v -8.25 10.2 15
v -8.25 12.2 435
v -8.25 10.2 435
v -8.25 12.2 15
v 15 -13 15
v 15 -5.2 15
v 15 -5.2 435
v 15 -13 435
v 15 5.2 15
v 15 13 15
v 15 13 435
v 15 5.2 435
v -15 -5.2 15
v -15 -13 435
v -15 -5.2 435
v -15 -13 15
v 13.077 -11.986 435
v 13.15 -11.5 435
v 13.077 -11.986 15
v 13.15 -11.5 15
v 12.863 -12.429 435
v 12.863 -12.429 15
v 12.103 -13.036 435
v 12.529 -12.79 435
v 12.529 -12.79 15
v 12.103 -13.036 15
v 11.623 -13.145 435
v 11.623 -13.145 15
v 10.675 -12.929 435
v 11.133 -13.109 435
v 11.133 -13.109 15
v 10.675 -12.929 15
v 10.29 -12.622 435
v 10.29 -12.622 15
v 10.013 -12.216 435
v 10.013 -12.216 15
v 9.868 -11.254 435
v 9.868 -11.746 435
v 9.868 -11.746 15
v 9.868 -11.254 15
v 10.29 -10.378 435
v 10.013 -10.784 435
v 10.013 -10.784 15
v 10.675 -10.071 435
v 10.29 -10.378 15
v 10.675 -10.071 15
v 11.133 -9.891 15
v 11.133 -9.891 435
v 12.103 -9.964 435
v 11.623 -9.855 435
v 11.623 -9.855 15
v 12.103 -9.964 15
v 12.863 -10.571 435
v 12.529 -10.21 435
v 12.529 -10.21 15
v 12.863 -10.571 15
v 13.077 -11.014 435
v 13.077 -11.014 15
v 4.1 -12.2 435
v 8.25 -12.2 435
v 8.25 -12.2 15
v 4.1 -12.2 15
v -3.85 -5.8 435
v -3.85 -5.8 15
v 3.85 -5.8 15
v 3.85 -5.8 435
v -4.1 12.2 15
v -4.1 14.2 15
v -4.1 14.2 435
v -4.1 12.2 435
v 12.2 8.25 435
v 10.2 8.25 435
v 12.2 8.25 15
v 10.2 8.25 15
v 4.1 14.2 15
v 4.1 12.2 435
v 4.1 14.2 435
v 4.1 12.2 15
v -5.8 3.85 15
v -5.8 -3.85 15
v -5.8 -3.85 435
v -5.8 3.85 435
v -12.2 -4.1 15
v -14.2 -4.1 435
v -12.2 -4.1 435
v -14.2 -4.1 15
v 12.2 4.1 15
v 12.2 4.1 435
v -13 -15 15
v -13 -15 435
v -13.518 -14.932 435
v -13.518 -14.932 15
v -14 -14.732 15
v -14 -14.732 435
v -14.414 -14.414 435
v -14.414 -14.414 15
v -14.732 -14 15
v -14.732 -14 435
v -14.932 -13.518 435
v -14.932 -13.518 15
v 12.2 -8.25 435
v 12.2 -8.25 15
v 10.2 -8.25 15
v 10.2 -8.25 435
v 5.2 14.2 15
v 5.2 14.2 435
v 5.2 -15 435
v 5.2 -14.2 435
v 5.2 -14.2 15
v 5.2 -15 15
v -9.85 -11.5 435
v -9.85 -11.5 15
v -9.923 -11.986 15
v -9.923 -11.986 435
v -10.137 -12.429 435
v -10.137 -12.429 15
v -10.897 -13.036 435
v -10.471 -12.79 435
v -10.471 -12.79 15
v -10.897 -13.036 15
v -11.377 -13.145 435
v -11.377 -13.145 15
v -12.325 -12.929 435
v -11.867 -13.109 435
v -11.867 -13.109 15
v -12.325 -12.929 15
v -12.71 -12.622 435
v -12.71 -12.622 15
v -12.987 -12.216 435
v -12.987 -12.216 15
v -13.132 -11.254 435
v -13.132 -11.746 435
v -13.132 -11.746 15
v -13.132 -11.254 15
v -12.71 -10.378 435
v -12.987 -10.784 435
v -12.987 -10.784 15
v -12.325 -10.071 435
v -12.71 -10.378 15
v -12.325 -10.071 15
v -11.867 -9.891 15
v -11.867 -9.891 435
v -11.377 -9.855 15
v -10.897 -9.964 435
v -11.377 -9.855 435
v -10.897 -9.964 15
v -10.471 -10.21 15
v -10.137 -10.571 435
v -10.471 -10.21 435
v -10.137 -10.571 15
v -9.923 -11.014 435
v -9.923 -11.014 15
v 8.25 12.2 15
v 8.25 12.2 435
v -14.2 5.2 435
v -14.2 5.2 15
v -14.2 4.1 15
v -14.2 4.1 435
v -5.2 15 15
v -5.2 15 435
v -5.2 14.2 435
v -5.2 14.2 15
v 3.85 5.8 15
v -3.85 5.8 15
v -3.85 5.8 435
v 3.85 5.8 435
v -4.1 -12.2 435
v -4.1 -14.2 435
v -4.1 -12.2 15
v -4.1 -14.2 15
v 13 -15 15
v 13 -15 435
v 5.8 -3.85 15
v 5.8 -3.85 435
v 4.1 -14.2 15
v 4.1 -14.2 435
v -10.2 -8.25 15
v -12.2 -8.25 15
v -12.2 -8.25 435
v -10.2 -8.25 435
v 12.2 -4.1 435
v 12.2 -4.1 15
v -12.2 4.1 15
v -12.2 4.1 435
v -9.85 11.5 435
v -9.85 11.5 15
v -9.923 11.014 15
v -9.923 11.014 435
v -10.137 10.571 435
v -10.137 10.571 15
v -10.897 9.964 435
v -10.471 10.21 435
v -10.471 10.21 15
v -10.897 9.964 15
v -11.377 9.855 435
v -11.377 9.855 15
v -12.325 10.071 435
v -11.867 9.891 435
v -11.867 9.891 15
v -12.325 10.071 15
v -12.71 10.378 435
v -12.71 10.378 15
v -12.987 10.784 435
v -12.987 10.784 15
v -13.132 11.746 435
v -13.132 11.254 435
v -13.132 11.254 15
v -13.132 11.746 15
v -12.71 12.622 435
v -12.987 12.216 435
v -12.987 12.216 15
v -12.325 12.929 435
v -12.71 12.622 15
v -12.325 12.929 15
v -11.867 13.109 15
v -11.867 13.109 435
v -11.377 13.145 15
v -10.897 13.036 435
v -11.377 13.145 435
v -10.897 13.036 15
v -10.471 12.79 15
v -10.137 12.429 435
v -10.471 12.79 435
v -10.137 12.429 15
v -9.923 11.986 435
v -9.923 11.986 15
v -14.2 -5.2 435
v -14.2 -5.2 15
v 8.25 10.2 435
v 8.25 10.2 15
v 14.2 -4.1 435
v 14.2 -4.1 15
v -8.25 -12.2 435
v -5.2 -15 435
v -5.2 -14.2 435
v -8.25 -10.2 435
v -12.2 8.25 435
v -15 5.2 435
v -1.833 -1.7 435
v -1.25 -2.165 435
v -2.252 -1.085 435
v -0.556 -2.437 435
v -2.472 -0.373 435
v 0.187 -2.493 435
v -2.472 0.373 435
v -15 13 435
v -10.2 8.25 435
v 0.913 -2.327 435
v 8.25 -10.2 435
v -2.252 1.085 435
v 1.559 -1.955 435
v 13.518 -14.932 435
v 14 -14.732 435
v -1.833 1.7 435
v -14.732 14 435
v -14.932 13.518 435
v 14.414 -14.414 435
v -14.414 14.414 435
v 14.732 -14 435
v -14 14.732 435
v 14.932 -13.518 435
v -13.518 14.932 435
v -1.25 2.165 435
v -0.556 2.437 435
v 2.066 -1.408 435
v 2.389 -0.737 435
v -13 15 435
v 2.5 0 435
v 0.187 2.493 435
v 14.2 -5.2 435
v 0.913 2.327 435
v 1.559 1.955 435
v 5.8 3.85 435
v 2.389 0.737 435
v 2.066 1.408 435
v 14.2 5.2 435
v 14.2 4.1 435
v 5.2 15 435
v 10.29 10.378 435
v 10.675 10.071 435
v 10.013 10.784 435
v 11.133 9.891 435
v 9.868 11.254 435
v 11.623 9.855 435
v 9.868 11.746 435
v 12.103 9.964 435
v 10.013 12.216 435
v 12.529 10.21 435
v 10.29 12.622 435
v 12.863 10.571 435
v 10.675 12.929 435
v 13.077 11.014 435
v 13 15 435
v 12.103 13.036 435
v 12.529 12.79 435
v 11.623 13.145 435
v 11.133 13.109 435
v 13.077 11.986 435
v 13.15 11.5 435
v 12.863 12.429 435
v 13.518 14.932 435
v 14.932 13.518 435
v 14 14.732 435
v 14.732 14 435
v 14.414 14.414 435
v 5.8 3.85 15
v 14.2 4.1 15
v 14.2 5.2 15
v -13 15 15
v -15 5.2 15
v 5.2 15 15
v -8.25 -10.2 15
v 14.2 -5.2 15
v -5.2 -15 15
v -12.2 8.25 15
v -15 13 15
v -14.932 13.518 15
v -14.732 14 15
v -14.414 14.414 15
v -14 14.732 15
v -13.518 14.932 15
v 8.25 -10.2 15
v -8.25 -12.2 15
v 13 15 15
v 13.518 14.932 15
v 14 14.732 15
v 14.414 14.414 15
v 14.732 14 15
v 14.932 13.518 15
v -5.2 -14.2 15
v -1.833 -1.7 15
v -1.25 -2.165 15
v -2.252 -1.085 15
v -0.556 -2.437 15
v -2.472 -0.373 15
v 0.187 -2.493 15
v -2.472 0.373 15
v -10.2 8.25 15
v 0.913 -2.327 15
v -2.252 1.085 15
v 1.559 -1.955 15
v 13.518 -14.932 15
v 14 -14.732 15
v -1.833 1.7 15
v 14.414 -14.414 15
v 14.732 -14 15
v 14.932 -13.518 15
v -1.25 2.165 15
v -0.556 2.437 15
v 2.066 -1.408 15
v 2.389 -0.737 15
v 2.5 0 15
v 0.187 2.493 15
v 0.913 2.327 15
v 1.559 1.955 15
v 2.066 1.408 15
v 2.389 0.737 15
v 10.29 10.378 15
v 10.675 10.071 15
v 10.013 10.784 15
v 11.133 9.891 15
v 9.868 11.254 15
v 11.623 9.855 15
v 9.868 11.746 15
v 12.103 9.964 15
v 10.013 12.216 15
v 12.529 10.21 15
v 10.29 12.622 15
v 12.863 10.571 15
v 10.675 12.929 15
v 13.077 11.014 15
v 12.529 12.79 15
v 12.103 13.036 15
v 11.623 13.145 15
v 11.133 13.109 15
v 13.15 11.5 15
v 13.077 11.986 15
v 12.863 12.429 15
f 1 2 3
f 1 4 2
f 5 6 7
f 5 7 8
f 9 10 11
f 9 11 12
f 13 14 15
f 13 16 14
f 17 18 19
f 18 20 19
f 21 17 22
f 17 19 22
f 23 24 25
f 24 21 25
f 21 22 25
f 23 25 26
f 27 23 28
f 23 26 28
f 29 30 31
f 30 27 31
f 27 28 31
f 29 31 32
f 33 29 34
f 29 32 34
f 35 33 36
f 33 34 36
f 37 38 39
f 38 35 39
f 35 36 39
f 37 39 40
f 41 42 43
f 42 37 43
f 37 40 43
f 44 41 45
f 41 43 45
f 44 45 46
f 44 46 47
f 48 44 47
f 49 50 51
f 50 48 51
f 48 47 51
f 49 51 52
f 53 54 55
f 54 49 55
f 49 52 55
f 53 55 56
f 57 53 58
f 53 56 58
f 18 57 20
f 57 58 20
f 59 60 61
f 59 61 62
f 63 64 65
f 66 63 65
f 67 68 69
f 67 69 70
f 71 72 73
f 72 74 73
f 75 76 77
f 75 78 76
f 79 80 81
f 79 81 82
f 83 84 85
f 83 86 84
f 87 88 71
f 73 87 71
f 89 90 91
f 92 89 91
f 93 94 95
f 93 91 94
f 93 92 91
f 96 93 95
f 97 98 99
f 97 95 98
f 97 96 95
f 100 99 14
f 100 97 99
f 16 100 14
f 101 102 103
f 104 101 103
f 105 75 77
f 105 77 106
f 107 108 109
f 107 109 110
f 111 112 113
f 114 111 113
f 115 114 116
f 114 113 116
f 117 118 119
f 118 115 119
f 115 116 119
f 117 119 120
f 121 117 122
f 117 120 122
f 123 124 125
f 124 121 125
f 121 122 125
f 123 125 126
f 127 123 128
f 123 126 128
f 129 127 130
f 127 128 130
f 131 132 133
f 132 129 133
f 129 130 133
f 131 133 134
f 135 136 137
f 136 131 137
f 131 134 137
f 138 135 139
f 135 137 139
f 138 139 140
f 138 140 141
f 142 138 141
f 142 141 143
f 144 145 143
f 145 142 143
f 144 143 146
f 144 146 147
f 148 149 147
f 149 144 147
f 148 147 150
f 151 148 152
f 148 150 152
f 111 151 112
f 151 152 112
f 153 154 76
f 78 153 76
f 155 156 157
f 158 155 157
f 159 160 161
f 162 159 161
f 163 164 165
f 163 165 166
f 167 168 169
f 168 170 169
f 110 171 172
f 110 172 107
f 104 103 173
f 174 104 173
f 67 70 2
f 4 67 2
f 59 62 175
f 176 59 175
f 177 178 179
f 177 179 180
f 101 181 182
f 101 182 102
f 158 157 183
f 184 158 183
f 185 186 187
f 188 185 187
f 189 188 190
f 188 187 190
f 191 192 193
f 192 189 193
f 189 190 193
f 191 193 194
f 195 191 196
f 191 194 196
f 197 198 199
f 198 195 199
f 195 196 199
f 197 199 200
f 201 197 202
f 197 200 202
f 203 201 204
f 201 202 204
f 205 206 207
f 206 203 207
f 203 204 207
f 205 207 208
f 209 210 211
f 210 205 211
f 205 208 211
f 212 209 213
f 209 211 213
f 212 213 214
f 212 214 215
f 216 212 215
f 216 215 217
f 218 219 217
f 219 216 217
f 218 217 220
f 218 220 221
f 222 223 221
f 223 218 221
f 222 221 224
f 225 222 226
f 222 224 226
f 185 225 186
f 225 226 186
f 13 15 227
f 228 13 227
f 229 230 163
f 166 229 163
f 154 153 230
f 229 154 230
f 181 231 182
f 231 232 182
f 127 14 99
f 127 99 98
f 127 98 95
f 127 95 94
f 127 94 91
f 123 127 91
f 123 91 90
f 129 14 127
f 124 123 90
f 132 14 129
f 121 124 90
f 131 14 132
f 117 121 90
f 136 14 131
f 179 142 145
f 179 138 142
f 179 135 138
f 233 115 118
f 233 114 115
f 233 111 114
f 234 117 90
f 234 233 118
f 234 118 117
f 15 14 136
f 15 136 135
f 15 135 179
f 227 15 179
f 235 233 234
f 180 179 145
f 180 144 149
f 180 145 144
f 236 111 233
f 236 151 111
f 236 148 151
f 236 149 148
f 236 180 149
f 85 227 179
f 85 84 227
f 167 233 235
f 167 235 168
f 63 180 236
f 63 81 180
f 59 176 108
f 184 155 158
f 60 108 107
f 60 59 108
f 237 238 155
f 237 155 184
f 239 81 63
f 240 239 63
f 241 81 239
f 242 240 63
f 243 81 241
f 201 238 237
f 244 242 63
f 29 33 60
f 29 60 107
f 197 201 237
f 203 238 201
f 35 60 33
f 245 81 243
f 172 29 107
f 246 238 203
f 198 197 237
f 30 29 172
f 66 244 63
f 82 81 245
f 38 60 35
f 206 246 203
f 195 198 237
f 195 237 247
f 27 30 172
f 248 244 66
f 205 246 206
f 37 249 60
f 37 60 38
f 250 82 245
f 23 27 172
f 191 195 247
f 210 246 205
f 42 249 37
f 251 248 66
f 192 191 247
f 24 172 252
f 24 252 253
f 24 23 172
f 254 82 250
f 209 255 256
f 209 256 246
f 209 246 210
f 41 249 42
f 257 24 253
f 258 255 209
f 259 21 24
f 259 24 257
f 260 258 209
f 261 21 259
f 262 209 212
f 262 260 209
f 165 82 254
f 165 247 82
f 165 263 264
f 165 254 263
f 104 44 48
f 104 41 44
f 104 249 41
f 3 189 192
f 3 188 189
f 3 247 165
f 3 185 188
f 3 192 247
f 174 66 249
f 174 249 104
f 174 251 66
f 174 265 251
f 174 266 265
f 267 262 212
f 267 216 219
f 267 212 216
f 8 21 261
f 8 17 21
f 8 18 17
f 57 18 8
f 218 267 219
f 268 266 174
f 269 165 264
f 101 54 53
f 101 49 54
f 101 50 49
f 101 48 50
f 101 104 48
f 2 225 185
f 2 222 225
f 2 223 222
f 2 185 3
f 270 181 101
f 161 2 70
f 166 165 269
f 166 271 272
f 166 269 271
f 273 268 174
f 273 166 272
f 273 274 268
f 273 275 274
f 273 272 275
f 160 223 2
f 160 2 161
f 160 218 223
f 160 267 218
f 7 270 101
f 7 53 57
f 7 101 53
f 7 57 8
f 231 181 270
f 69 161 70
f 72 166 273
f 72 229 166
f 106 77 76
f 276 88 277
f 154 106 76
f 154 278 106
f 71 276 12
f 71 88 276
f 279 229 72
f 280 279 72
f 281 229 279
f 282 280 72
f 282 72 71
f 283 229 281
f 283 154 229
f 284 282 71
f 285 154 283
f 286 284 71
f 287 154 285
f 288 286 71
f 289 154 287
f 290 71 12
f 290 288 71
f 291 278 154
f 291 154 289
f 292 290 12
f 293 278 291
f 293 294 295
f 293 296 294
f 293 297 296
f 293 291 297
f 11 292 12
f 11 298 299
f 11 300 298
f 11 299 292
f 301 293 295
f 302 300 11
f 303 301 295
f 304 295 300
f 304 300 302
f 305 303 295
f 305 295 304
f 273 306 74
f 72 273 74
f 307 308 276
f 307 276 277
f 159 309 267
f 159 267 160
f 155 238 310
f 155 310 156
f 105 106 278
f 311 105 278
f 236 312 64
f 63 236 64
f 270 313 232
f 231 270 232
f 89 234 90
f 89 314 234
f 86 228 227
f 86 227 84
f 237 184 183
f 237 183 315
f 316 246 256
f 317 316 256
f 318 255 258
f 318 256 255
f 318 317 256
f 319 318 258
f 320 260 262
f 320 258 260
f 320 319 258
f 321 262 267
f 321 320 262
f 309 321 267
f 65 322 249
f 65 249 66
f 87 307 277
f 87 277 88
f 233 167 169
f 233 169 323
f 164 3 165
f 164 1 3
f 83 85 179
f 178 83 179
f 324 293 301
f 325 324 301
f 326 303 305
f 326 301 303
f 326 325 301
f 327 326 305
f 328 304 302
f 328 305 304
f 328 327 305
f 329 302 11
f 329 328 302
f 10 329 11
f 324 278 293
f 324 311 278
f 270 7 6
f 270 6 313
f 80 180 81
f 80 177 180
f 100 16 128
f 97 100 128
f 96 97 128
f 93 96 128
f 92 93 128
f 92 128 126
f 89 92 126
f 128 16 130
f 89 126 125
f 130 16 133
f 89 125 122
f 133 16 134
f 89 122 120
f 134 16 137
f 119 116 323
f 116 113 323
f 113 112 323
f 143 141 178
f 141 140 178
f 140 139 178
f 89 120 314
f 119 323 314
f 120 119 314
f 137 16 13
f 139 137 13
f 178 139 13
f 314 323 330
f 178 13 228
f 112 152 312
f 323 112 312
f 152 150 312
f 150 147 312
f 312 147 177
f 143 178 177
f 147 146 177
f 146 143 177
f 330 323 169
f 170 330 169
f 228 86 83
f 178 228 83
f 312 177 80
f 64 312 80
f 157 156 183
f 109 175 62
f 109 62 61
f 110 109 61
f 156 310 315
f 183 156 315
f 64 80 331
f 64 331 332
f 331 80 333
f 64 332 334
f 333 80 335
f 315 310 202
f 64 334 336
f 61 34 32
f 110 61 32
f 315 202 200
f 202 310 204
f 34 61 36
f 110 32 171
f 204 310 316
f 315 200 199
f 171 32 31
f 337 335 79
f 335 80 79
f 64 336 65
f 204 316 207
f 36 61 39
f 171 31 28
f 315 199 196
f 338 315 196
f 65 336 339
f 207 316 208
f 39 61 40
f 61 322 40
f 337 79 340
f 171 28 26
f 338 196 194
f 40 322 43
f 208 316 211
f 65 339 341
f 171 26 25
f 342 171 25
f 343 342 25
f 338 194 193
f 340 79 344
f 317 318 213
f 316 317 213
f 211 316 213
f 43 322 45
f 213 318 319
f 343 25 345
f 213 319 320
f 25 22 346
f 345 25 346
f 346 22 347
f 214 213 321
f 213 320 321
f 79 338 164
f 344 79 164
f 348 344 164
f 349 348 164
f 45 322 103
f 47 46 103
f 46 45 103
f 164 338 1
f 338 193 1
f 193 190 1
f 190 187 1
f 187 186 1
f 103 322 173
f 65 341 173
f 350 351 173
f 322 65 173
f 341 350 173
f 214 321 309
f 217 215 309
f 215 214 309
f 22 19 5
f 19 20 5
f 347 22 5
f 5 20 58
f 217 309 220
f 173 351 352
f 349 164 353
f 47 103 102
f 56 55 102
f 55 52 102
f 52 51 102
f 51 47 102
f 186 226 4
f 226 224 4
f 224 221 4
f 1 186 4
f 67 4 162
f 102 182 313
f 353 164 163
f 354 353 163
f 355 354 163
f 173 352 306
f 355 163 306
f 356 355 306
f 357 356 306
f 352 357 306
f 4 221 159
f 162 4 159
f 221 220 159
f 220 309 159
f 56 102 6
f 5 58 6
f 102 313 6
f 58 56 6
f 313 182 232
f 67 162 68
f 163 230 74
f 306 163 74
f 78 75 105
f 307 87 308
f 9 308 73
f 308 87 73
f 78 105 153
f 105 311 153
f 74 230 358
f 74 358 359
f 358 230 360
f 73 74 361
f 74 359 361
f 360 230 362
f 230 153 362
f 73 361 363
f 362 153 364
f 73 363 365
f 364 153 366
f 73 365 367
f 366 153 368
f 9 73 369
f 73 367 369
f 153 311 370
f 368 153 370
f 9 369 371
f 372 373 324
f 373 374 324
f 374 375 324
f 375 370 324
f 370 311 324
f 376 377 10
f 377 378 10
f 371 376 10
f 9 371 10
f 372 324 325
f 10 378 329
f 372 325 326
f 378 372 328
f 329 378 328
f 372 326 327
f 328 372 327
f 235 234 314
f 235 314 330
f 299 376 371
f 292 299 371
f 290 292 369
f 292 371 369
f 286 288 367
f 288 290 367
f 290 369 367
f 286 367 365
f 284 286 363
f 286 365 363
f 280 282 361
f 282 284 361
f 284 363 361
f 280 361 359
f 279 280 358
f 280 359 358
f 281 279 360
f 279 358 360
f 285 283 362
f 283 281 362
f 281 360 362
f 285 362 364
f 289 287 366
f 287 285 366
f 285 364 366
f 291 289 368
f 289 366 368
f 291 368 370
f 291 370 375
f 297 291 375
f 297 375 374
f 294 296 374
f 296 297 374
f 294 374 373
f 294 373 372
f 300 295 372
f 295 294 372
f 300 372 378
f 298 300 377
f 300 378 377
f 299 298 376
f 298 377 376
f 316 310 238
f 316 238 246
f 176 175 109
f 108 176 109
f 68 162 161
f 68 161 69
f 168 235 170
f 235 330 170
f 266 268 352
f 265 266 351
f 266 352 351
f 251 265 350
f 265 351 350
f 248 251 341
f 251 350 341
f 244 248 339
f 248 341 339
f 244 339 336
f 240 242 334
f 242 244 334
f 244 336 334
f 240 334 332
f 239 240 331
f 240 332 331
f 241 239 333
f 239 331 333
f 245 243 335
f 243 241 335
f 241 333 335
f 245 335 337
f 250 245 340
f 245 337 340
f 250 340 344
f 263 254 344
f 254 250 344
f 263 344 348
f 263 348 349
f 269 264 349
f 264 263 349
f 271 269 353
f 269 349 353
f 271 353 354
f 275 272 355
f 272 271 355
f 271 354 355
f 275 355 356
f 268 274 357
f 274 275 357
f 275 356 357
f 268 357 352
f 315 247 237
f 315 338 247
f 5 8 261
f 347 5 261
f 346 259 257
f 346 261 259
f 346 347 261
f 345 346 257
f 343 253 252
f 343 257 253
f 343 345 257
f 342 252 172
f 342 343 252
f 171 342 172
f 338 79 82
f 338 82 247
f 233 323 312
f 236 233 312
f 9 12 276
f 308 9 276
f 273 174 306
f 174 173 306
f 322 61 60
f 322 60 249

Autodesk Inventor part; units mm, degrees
sketch "Sketch" plane through (0, 0, 0) normal (0, 0, 1) x (1, 0, 0)
  line L0 (-13, 15) -> (13, 15)
  line L1 (15, 13) -> (15, -13)
  line L2 (-15, 15) -> (15, -15) construction
  line L3 (15, 15) -> (-15, -15) construction
  line L4 (-5.2, 15) -> (-5.2, 14.2)
  line L5 (-5.2, 14.2) -> (-4.1, 14.2)
  line L6 (-4.1, 14.2) -> (-4.1, 12.2)
  line L7 (-4.1, 12.2) -> (-8.25, 12.2)
  line L8 (-8.25, 12.2) -> (-8.25, 10.2)
  line L9 (-8.25, 10.2) -> (-3.85, 5.8)
  line L10 (-3.85, 5.8) -> (3.85, 5.8)
  line L11 (8.25, 12.2) -> (4.1, 12.2)
  line L12 (4.1, 12.2) -> (4.1, 14.2)
  line L13 (4.1, 14.2) -> (5.2, 14.2)
  line L14 (5.2, 14.2) -> (5.2, 15)
  line L15 (8.25, 12.2) -> (8.25, 10.2)
  line L16 (8.25, 10.2) -> (3.85, 5.8)
  line L17 (-2.5, 0) -> (0, 0)
  line L18 (-5.2, -15) -> (-5.2, -14.2)
  line L19 (-5.2, -14.2) -> (-4.1, -14.2)
  line L20 (-4.1, -14.2) -> (-4.1, -12.2)
  line L21 (-4.1, -12.2) -> (-8.25, -12.2)
  line L22 (-8.25, -12.2) -> (-8.25, -10.2)
  line L23 (-8.25, -10.2) -> (-3.85, -5.8)
  line L24 (-3.85, -5.8) -> (3.85, -5.8)
  line L25 (8.25, -12.2) -> (4.1, -12.2)
  line L26 (4.1, -12.2) -> (4.1, -14.2)
  line L27 (4.1, -14.2) -> (5.2, -14.2)
  line L28 (5.2, -14.2) -> (5.2, -15)
  line L29 (8.25, -12.2) -> (8.25, -10.2)
  line L30 (8.25, -10.2) -> (3.85, -5.8)
  line L31 (15, 5.2) -> (14.2, 5.2)
  line L32 (14.2, 5.2) -> (14.2, 4.1)
  line L33 (14.2, 4.1) -> (12.2, 4.1)
  line L34 (12.2, 4.1) -> (12.2, 8.25)
  line L35 (15, -5.2) -> (14.2, -5.2)
  line L36 (14.2, -5.2) -> (14.2, -4.1)
  line L37 (14.2, -4.1) -> (12.2, -4.1)
  line L38 (12.2, -4.1) -> (12.2, -8.25)
  line L39 (12.2, -8.25) -> (10.2, -8.25)
  line L40 (10.2, -8.25) -> (5.8, -3.85)
  line L41 (5.8, -3.85) -> (5.8, 3.85)
  line L42 (5.8, 3.85) -> (10.2, 8.25)
  line L43 (10.2, 8.25) -> (12.2, 8.25)
  line L44 (-15, 5.2) -> (-14.2, 5.2)
  line L45 (-14.2, 5.2) -> (-14.2, 4.1)
  line L46 (-14.2, 4.1) -> (-12.2, 4.1)
  line L47 (-12.2, 4.1) -> (-12.2, 8.25)
  line L48 (-15, -5.2) -> (-14.2, -5.2)
  line L49 (-14.2, -5.2) -> (-14.2, -4.1)
  line L50 (-14.2, -4.1) -> (-12.2, -4.1)
  line L51 (-12.2, -4.1) -> (-12.2, -8.25)
  line L52 (-12.2, -8.25) -> (-10.2, -8.25)
  line L53 (-10.2, -8.25) -> (-5.8, -3.85)
  line L54 (-5.8, -3.85) -> (-5.8, 3.85)
  line L55 (-5.8, 3.85) -> (-10.2, 8.25)
  line L56 (-10.2, 8.25) -> (-12.2, 8.25)
  circle A0 centre (11.5, 11.5) radius 1.65
  circle A1 centre (11.5, -11.5) radius 1.65
  circle A2 centre (-11.5, 11.5) radius 1.65
  circle A3 centre (-11.5, -11.5) radius 1.65
  line L57 (-15, -13) -> (-15, -5.2)
  line L58 (-15, 5.2) -> (-15, 13)
  line L59 (13, -15) -> (5.2, -15)
  line L60 (-5.2, -15) -> (-13, -15)
  arc A4 (-13, 15) -> (-15, 13) centre (-13, 13) ccw
  arc A5 (15, 13) -> (13, 15) centre (13, 13) ccw
  arc A6 (13, -15) -> (15, -13) centre (13, -13) ccw
  arc A7 (-15, -13) -> (-13, -15) centre (-13, -13) ccw
  circle A8 centre (0, 0) radius 2.5
  point P0 (0, 0)
  point P1 (0, 5.8)
  point P2 (0, -2.5)
  point P3 (0, 2.5)
  dimension "d2" = 8.2
  dimension "d3" = 4.1
  dimension "d4" = 10.4
  dimension "d5" = 5.2
  dimension "d8" = 9.2
  dimension "d11" = 16.5
  dimension "d12" = 8.25
  dimension "d14" = 0.8
  dimension "d15" = 2
  dimension "d16" = 2
  dimension "d34" = 0.8
  dimension "d35" = 10.4
  dimension "d36" = 5.2
  dimension "d37" = 8.2
  dimension "d38" = 4.1
  dimension "d39" = 2
  dimension "d40" = 16.5
  dimension "d41" = 8.25
  dimension "d42" = 2
  dimension "d43" = 9.2
  dimension "d44" = 23
  dimension "d45" = 11.5
  dimension "d46" = 23
  dimension "d48" = 3.3
  dimension "d55" = 2
  dimension "d62" = 5
  dimension "d65" = 11.5
  dimension "d66" = 6.4
  dimension "d67" = 3.25
  dimension "d68" = 4.15
  dimension "d69" = 0.8
  dimension "d70" = 2
  dimension "d71" = 2.7577
  dimension "d72" = 5.8
  dimension "d73" = 2.7577
  dimension "d74" = 4.15
  dimension "d75" = 2
  dimension "d76" = 3.25
  dimension "d77" = 2
  dimension "d78" = 1.1
  dimension "d79" = 0.8
  dimension "d80" = 135
  dimension "d81" = 2
  dimension "d82" = 1.1
  dimension "d83" = 7.4
  dimension "d84" = 7.4
  dimension "d85" = 6.4
  dimension "d86" = 6.3
ref_plane "Work Plane3" through (0, 0, 250) normal (0, 0, 1) x (1, 0, 0)
ref_plane "Start Plane" through (0, 0, 0) normal (0, 0, 1) x (1, 0, 0)
ref_plane "End Plane" through (0, 0, 450) normal (0, 0, 1) x (1, 0, 0)
ref_plane "Start Plane1" through (0, 0, 0) normal (0, 0, 1) x (1, 0, 0)
ref_plane "End Plane1" through (0, 0, 450) normal (0, 0, 1) x (1, 0, 0)
ref_plane "Start Plane2" through (0, 0, 15) normal (0, 0, 1) x (1, 0, 0)
ref_plane "End Plane2" through (0, 0, 435) normal (0, 0, 1) x (1, 0, 0)
extrude "Body" add sketch "Sketch" along normal up to surface (420 mm away) from surface at 15 contours L0 L4 L5 L6 L7 L8 L9 L10 L16 L15 L11 L12 L13 L14 A5 L1 L31 L32 L33 L34 L43 L42 L41 L40 L39 L38 L37 L36 L35 A6 L59 L28 L27 L26 L25 L29 L30 L24 L23 L22 L21 L20 L19 L18 L60 A7 L57 L48 L49 L50 L51 L52 L53 L54 L55 L56 L47 L46 L45 L44 L58 A4
sketch "Sketch7" plane through (0, 0, 0) normal (0, 0, 1) x (1, 0, 0)
  line L0 (0, 0) -> (10, 0)
ref_plane "Work Plane10" through (0, 0, 0) normal (0, -1, 0) x (1, 0, 0)
sketch "Sketch8" plane through (0, 0, 0) normal (0, -1, 0) x (1, 0, 0)
  line L0 (-2, 15) -> (12, 15)
  line L1 (-2, 435) -> (12, 435)
  dimension "d100" = 420
ref_plane "Work Plane11" through (-225, 5.2, 435) normal (0, 0, 1) x (1, 0, 0)
split "Split1" plane through (-225, 5.2, 435) removes the side toward (0, 0, 1)
ref_plane "Work Plane12" through (225, -13, 15) normal (0, 0, -1) x (-1, 0, 0)
split "Split2" plane through (225, -13, 15) removes the side toward (0, 0, -1)
equation "\"d3\" = 0.5 * d2"
equation "\"d5\" = 0.5 * d4"
equation "\"d12\" = 0.5 * d11"
equation "\"d36\" = 0.5 * d35"
equation "\"d38\" = 0.5 * d37"
equation "\"d41\" = 0.5 * d40"
equation "\"d45\" = 0.5 * d44"
equation "\"G_OFFSET_START\" = 0"
equation "\"G_OFFSET_END\" = 0"
equation "\"G_L\" = 500"
equation "\"G_OFFSET_START1\" = 0"
equation "\"G_OFFSET_END1\" = 0"
equation "\"G_OFFSET_START2\" = -15"
equation "\"G_OFFSET_END2\" = -15"
equation "\"d95\" = -G_OFFSET_START2"
equation "\"d96\" = Length + G_OFFSET_END2"
equation "\"Length\" = 450"
properties part number "420 mm" material "Aluminum 6061"
